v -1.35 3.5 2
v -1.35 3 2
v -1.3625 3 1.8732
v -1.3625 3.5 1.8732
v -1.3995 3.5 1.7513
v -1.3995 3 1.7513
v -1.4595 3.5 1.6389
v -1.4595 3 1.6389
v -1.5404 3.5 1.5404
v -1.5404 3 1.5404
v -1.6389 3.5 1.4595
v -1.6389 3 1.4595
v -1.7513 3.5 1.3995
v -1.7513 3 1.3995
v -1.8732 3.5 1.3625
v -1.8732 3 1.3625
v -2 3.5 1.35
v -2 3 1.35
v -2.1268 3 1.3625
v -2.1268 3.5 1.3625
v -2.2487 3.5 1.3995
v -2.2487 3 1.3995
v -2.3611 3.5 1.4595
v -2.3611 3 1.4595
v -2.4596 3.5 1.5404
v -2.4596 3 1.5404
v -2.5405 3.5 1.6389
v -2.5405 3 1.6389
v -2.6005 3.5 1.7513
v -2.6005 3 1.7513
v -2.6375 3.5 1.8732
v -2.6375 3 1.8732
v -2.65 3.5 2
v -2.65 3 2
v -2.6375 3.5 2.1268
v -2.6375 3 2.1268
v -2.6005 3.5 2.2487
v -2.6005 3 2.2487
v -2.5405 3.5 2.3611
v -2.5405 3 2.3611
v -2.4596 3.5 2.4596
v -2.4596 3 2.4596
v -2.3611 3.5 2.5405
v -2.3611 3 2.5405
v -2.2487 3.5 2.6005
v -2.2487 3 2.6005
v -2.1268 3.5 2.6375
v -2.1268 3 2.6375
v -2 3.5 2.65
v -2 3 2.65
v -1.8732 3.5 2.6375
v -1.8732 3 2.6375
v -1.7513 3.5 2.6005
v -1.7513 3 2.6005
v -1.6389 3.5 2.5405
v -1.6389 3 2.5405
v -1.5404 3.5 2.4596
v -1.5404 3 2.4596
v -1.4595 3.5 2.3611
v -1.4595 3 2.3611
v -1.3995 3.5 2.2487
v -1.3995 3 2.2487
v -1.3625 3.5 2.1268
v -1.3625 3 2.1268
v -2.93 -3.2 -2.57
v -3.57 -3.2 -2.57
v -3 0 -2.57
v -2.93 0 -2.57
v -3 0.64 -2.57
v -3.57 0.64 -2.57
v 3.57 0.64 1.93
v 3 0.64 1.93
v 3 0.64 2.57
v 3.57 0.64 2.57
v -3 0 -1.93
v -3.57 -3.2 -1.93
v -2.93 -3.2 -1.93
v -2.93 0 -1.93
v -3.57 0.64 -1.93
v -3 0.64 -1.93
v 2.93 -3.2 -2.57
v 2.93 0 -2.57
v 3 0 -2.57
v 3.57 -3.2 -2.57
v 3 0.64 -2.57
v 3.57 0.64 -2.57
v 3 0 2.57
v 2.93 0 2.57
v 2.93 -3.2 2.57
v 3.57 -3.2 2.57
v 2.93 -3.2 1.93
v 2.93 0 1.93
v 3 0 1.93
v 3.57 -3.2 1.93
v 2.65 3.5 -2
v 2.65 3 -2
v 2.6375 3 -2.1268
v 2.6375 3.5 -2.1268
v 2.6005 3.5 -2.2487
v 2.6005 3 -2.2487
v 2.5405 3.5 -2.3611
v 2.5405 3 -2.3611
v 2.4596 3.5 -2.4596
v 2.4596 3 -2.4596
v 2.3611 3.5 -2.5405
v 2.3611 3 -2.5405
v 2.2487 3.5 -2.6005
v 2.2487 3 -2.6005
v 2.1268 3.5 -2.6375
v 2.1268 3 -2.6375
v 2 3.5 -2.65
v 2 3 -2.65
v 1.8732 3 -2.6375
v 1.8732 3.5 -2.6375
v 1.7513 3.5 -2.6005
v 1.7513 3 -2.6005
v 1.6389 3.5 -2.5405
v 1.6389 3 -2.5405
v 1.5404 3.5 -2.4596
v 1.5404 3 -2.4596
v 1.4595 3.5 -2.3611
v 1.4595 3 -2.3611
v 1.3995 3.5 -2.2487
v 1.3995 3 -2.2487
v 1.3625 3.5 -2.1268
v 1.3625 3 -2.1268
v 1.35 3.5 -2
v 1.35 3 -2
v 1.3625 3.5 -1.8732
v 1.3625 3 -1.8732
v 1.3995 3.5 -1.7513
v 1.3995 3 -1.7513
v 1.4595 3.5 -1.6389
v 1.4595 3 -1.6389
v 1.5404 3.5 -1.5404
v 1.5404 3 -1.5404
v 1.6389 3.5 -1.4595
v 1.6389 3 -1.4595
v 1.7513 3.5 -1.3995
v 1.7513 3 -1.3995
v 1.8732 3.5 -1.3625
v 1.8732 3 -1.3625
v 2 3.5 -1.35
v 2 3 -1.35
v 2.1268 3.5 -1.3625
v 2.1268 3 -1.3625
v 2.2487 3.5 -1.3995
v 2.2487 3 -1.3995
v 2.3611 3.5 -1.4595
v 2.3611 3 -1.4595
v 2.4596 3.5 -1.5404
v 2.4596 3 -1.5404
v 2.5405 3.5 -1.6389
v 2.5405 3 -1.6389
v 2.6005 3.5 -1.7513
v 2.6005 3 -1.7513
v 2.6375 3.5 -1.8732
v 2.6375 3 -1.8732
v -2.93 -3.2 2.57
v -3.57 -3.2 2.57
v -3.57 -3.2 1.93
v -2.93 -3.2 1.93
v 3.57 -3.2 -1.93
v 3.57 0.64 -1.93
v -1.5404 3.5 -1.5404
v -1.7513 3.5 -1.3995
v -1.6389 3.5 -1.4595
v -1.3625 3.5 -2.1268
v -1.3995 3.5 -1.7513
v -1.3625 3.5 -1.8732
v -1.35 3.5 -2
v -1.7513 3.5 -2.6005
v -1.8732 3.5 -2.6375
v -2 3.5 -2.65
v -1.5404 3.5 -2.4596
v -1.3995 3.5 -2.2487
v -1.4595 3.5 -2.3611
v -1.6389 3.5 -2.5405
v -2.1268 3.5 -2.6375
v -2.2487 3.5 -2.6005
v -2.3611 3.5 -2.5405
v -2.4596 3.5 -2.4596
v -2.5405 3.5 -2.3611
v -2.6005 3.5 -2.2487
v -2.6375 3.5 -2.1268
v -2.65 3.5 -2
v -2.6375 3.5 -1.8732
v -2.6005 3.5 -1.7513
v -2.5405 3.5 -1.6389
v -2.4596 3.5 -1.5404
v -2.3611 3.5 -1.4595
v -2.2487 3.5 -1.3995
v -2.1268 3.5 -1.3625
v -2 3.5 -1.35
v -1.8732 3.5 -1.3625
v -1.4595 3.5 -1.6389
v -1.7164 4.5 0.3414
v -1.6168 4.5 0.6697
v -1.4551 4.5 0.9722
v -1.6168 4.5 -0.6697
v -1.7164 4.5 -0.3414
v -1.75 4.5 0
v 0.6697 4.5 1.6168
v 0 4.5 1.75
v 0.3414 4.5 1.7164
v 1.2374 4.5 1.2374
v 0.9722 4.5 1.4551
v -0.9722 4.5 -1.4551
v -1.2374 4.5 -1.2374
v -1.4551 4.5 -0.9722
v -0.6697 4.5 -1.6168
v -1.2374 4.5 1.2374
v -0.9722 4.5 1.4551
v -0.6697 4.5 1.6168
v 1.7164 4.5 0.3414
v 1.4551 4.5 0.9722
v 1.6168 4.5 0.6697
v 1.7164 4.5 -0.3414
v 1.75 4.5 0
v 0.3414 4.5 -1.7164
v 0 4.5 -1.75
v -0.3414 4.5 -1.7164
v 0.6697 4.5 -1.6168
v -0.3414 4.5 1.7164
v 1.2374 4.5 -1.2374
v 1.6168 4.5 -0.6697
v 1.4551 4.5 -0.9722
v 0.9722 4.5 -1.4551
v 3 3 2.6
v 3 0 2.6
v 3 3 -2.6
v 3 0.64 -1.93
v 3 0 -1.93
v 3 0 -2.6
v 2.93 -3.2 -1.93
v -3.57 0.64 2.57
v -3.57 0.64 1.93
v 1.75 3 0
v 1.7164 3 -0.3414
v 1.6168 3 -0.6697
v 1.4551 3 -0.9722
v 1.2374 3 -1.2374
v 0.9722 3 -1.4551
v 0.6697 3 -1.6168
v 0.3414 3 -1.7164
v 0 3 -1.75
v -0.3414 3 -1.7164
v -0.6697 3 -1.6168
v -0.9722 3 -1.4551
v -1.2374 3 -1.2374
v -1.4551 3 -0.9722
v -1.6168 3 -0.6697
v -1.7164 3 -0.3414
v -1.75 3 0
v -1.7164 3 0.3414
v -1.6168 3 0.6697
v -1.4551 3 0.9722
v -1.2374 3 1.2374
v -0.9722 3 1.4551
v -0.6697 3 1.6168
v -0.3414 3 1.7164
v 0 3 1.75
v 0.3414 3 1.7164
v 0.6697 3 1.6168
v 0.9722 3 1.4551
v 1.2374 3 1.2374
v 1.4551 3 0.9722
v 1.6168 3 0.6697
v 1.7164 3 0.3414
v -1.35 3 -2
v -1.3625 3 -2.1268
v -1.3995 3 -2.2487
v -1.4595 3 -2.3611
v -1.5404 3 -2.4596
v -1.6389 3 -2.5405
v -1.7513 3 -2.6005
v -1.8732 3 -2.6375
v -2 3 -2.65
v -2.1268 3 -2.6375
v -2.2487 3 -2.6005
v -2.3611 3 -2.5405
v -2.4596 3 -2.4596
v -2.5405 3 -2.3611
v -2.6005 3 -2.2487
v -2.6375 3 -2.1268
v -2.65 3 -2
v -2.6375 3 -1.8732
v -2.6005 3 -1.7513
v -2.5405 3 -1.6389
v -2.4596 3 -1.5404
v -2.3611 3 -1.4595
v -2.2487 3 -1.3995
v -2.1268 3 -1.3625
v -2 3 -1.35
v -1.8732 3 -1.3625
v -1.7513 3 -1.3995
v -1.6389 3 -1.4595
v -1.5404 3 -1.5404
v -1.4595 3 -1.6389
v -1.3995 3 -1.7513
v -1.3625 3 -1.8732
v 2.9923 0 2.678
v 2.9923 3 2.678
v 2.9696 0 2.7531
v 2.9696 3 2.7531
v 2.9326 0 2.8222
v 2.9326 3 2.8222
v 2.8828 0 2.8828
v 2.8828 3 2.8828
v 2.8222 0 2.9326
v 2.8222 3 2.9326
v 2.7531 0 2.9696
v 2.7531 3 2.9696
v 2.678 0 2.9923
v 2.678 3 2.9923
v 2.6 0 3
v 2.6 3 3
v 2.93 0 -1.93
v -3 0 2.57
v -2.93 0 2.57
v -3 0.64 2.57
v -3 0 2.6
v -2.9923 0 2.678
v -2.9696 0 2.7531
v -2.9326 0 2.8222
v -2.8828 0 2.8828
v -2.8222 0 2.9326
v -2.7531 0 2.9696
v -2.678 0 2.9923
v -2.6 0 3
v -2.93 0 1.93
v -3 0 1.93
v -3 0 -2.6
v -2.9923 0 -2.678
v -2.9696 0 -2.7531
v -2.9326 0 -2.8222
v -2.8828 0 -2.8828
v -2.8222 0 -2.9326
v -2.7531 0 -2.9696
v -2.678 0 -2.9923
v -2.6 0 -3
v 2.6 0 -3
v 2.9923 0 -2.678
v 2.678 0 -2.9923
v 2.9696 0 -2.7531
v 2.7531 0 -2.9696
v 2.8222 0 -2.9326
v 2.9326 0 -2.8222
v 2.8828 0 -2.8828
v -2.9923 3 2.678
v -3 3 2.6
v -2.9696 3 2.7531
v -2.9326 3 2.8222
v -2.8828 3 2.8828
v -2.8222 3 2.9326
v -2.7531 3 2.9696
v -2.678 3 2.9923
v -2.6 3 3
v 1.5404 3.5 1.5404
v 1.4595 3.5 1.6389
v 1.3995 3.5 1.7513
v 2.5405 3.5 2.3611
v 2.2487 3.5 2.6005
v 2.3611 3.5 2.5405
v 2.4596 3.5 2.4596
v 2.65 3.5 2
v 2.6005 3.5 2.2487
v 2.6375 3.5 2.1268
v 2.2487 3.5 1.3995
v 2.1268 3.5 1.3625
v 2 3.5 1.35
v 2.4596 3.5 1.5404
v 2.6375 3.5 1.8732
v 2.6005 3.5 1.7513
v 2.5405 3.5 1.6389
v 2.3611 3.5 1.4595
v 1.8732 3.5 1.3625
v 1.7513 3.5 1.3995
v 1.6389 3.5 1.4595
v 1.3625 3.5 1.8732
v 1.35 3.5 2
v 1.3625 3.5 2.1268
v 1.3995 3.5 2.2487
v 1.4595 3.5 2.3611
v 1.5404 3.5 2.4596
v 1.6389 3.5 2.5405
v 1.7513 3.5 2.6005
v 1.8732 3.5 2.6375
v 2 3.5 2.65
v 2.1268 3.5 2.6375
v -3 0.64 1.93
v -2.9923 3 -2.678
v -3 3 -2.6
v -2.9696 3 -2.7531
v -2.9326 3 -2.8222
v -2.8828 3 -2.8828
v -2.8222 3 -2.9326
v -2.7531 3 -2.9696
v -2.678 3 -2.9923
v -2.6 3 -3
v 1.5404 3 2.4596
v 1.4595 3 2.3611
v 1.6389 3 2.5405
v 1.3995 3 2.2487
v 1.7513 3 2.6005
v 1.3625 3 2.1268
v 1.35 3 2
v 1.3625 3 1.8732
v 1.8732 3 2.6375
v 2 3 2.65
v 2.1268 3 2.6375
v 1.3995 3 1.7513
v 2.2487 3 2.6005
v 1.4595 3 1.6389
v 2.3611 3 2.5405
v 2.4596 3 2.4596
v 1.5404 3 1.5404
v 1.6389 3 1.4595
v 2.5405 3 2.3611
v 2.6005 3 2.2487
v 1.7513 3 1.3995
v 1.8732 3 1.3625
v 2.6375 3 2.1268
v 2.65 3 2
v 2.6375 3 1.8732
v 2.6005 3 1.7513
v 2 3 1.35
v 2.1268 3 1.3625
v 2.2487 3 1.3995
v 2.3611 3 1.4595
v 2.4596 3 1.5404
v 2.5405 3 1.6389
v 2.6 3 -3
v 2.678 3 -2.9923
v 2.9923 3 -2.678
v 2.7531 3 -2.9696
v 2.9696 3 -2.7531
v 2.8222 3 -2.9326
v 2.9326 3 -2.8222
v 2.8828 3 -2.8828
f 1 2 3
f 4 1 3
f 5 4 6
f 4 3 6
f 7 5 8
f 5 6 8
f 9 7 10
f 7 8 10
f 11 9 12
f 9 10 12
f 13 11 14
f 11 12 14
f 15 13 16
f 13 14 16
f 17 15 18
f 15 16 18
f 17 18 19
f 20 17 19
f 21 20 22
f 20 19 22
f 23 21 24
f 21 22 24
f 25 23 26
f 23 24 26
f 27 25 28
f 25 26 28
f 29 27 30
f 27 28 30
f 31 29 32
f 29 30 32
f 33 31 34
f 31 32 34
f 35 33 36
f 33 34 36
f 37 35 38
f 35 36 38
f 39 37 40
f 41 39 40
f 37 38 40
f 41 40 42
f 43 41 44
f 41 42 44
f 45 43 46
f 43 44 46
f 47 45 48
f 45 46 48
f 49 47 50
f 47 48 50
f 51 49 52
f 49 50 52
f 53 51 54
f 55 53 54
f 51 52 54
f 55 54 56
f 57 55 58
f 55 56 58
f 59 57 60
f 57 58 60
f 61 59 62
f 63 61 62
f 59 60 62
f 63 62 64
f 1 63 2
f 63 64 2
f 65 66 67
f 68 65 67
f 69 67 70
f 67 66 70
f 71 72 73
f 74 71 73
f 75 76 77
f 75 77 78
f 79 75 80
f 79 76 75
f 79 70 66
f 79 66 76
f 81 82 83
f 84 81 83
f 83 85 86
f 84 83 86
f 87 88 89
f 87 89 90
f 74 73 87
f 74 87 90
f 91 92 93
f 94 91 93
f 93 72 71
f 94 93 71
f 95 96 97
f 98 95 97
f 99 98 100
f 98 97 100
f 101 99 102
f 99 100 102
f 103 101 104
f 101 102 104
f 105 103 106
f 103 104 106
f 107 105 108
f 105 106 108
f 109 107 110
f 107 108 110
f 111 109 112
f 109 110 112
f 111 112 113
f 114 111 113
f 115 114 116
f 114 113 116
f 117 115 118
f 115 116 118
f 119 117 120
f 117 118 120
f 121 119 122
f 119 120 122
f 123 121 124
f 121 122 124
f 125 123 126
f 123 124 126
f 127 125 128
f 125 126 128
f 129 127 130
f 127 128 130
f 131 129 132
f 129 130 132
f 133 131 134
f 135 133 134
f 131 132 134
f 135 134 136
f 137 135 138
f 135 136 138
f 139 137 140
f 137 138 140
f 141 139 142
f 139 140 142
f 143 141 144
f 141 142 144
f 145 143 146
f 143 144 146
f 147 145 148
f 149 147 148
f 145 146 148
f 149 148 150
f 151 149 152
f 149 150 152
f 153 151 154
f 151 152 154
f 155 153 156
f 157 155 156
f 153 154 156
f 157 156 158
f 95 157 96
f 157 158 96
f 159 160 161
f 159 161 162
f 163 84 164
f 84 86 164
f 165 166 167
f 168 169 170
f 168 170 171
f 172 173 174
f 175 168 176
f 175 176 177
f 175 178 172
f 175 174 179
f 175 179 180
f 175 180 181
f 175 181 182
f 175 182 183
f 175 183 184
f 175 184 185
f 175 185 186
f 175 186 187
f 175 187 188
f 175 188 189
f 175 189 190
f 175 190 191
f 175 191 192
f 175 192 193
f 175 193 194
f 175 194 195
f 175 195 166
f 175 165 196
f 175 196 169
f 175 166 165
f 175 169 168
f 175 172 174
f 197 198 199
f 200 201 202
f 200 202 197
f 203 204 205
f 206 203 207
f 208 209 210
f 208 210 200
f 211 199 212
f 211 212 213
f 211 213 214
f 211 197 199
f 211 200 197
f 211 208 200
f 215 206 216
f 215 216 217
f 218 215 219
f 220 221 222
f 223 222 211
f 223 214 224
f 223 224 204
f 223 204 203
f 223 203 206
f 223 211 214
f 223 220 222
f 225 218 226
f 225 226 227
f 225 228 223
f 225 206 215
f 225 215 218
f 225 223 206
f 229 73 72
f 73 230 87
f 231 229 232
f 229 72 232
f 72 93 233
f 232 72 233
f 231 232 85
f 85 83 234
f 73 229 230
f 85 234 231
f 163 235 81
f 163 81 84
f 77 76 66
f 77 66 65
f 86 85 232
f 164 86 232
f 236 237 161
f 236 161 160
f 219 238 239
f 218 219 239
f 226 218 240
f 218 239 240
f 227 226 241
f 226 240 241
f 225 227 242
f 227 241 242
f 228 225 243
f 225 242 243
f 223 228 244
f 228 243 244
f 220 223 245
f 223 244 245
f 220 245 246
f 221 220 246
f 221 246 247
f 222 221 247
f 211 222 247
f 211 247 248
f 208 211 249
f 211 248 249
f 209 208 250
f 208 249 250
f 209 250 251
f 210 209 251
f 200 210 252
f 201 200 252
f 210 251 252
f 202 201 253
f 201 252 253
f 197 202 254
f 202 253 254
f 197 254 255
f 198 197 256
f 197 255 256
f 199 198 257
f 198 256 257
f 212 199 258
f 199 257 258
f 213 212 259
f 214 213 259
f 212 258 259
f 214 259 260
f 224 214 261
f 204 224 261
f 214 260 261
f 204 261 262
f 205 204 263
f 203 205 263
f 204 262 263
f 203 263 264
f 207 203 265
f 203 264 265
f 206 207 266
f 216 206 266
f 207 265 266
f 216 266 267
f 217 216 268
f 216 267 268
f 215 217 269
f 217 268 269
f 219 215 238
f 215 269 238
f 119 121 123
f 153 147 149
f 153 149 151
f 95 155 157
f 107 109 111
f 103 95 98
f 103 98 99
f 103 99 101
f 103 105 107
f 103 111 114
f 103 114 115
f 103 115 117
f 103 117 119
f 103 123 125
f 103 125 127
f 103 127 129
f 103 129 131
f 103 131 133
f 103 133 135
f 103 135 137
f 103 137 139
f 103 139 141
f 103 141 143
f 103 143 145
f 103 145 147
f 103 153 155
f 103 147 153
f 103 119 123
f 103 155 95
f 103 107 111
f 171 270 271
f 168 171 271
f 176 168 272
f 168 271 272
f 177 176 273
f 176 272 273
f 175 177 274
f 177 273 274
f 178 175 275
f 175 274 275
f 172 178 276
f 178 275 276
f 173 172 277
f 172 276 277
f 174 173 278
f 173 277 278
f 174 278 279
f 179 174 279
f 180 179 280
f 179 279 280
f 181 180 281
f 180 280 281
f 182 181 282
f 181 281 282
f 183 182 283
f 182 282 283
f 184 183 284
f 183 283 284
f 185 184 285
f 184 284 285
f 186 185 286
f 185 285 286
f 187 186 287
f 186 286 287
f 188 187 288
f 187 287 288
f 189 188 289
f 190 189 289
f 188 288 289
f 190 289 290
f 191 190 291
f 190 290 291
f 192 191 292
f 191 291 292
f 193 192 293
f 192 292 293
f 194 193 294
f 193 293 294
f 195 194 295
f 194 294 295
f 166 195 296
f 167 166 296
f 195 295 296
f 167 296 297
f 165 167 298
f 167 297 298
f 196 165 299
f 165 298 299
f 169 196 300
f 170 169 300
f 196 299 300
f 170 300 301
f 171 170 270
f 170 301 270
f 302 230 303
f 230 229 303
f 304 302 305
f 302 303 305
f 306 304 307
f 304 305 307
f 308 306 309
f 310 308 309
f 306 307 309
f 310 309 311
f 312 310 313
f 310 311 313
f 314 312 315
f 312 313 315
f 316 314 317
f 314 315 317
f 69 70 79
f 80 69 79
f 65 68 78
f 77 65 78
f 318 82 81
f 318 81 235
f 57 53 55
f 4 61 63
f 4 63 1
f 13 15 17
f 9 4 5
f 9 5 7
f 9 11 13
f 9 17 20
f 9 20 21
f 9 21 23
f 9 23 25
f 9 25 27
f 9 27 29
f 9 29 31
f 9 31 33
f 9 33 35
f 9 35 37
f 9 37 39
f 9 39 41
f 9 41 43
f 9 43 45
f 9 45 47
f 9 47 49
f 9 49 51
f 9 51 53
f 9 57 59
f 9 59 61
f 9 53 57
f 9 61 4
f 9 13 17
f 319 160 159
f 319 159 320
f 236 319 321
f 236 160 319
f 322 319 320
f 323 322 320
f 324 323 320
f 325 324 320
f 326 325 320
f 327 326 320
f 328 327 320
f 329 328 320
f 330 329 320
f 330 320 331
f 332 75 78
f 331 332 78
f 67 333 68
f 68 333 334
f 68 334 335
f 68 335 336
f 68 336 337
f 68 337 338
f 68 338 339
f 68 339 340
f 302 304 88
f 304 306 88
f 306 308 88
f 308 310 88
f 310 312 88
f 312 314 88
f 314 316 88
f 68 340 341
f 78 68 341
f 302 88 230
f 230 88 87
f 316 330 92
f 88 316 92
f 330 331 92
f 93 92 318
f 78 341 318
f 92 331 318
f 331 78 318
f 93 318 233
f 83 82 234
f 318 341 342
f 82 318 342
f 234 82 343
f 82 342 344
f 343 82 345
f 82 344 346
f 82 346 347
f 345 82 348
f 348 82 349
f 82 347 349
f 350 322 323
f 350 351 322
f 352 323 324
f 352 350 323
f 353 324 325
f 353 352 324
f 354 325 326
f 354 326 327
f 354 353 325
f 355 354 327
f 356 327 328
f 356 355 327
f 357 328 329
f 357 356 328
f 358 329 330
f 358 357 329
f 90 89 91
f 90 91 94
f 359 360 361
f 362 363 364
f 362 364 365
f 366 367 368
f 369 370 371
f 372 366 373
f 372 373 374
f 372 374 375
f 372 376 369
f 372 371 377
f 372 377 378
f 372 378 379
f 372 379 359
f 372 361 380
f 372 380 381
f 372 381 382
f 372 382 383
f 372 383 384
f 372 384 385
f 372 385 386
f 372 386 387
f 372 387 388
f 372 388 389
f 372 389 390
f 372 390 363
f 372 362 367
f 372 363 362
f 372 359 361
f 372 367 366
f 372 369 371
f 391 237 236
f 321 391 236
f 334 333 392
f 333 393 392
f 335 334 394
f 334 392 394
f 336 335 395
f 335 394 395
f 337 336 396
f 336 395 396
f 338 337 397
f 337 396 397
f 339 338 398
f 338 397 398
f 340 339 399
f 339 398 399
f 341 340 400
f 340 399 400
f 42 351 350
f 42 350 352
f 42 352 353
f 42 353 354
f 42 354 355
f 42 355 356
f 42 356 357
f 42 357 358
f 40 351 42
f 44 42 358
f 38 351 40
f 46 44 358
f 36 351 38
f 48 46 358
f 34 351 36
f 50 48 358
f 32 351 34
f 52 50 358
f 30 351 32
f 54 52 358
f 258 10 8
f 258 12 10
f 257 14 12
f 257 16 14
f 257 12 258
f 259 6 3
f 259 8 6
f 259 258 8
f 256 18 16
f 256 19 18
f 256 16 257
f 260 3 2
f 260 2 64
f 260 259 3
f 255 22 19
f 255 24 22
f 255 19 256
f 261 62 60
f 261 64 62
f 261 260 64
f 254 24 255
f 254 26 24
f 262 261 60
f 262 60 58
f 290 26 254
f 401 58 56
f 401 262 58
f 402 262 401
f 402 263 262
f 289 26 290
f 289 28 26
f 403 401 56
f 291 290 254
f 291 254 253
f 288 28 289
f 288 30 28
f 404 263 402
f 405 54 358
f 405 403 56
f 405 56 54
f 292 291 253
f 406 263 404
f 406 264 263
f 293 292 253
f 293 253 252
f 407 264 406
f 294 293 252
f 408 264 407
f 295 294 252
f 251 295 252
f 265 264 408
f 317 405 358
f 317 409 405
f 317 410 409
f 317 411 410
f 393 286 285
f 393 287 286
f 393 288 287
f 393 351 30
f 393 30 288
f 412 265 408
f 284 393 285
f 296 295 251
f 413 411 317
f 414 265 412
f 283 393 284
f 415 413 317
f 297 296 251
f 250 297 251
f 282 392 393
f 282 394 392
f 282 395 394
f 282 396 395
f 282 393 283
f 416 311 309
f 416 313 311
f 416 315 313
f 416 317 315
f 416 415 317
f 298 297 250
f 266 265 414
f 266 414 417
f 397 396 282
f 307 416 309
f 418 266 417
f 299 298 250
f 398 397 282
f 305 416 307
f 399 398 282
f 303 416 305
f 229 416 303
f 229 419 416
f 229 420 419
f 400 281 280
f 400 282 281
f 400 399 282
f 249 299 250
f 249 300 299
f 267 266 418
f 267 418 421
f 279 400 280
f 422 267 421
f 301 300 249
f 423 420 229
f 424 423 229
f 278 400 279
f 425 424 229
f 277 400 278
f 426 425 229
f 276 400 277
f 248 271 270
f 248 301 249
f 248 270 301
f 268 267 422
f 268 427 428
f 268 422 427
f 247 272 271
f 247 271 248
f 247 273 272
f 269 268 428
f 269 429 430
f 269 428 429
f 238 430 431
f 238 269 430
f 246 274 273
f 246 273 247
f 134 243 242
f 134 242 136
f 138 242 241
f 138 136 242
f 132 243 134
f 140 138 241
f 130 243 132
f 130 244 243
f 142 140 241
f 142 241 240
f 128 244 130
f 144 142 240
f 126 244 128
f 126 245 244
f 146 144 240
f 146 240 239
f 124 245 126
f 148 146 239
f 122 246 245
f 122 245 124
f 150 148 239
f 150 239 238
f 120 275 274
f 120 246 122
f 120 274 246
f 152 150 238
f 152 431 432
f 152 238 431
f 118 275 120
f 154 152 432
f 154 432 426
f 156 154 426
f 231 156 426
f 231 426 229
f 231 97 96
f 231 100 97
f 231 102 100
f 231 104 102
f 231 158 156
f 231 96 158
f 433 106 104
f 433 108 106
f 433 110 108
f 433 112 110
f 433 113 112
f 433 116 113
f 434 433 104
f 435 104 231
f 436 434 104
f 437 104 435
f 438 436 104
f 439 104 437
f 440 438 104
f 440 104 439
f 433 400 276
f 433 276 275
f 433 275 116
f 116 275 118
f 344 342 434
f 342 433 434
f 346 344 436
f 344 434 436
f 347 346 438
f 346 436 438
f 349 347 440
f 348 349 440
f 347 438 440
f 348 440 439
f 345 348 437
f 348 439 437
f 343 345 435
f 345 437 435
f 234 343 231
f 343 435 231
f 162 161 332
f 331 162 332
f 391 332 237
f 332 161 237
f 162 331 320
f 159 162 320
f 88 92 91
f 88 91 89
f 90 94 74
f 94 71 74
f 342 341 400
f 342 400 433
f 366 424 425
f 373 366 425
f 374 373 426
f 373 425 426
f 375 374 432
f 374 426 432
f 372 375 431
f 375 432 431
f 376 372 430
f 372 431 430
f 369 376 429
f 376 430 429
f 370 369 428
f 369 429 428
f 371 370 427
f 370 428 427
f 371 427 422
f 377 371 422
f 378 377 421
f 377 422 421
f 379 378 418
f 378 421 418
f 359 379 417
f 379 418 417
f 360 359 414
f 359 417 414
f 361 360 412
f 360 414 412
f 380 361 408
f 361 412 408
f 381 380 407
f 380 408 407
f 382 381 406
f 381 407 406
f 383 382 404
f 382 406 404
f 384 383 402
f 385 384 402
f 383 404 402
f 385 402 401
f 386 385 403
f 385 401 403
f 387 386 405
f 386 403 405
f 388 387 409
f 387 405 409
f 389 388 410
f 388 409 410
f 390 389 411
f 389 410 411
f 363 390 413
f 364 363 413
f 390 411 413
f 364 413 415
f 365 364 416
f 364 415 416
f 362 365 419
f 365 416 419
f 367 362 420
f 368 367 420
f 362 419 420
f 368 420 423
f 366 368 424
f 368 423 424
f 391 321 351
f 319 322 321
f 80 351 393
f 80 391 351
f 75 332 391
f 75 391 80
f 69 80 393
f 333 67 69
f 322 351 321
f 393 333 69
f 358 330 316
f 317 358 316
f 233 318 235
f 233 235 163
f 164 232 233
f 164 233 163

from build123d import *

# Parameters (mm, degrees)
SKETCH1_W           = 6
SKETCH1_H           = 6
BOSS_EXTRUDE1_DEPTH = 3
SKETCH2_R           = 1.75
BOSS_EXTRUDE2_DEPTH = 1.5
SKETCH3_R           = 0.65
BOSS_EXTRUDE3_DEPTH = 0.5
SKETCH4_W           = 0.64
SKETCH4_H           = 0.64
BOSS_EXTRUDE4_DEPTH = 3.2
FILLET1_R           = 0.4
SKETCH6_W           = 0.64
SKETCH6_H           = 0.64
BOSS_EXTRUDE6_DEPTH = 7.14


with BuildPart() as part:
    # Sketch1 → Boss-Extrude1 (new body)
    with BuildSketch(Plane(origin=(0, 0, 0), x_dir=(1, 0, 0), z_dir=(0, 1, 0))):
        Rectangle(SKETCH1_W, SKETCH1_H)
    extrude(amount=BOSS_EXTRUDE1_DEPTH)

    # Sketch2 → Boss-Extrude2 (add)
    with BuildSketch(Plane(origin=(0, 3, 0), x_dir=(1, 0, 0), z_dir=(0, 1, 0))):
        Circle(SKETCH2_R)
    extrude(amount=BOSS_EXTRUDE2_DEPTH)

    # Sketch3 → Boss-Extrude3 (add)
    with BuildSketch(Plane(origin=(0, 3, 0), x_dir=(1, 0, 0), z_dir=(0, 1, 0))):
        with Locations((-2, 2)):
            Circle(SKETCH3_R)
        with Locations((-2, -2)):
            Circle(SKETCH3_R)
        with Locations((2, -2)):
            Circle(SKETCH3_R)
        with Locations((2, 2)):
            Circle(SKETCH3_R)
    extrude(amount=BOSS_EXTRUDE3_DEPTH)

    # Sketch4 → Boss-Extrude4 (add)
    with BuildSketch(Plane.XZ):
        with Locations((-3.25, 2.25)):
            Rectangle(SKETCH4_W, SKETCH4_H)
        with Locations((3.25, 2.25)):
            Rectangle(SKETCH4_W, SKETCH4_H)
        with Locations((3.25, -2.25)):
            Rectangle(SKETCH4_W, SKETCH4_H)
        with Locations((-3.25, -2.25)):
            Rectangle(SKETCH4_W, SKETCH4_H)
    extrude(amount=BOSS_EXTRUDE4_DEPTH)

    # Fillet1
    fillet1_edges = [part.edges().sort_by_distance(p)[0] for p in [
        (3, 1.5, 3),
        (-3, 1.5, 3),
        (-3, 1.5, -3),
        (3, 1.5, -3),
    ]]
    fillet(fillet1_edges, radius=FILLET1_R)

    # Sketch6 → Boss-Extrude6 (add)
    with BuildSketch(Plane.ZY.offset(3.57)):
        with Locations((-2.25, 0.32)):
            Rectangle(SKETCH6_W, SKETCH6_H)
        with Locations((2.25, 0.32)):
            Rectangle(SKETCH6_W, SKETCH6_H)
    extrude(amount=-BOSS_EXTRUDE6_DEPTH)


solid = part.part
